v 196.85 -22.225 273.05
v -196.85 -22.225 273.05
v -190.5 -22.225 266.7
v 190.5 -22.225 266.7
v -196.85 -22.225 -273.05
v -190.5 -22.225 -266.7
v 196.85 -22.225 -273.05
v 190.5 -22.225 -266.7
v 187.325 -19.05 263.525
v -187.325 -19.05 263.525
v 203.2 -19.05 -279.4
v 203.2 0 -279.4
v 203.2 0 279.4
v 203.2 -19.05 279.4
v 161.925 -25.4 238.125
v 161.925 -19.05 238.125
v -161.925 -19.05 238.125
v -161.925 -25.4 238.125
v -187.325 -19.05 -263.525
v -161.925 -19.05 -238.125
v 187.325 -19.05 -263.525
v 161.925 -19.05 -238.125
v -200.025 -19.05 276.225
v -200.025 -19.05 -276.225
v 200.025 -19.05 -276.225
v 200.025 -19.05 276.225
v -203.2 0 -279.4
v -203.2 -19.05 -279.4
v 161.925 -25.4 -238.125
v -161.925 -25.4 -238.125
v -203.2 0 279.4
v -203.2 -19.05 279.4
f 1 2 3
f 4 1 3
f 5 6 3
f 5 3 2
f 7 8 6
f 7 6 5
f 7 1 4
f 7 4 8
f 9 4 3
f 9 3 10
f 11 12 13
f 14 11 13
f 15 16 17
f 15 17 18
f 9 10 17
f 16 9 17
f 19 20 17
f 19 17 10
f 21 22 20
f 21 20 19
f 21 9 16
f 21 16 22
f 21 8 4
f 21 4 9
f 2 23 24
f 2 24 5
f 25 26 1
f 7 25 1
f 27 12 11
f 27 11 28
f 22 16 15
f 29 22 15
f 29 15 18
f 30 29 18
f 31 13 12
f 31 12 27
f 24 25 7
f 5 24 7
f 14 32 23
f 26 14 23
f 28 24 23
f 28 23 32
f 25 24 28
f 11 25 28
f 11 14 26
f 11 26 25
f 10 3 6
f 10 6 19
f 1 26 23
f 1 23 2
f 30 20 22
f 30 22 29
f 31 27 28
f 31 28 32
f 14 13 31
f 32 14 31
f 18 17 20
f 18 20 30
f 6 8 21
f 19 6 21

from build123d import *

# Parameters (mm, degrees)
F0_W     = 203.2
F0_H     = 558.8
F1_DEPTH = 25.4


with BuildPart() as f1:
    # F0 (on Front) → F1 (new body)
    with BuildSketch(Plane.XZ):
        with Locations((101.6, 0)):
            Rectangle(F0_W, F0_H)
    extrude(amount=F1_DEPTH)

    # F4: sweep along a path in F3
    with BuildLine(Plane.XZ.offset(25.4)) as f4_path:
        Line((0, -238.125), (161.925, -238.125))
        Line((161.925, -238.125), (161.925, 238.125))
        Line((161.925, 238.125), (0, 238.125))
    # F2 (on Right) → F4 (sweep, cut)
    with BuildSketch(Plane.YZ):
        Polygon((-19.05, -263.525), (-19.05, -238.125), (-25.4, -238.125), (-25.4, -279.4), (-19.05, -279.4), (-19.05, -276.225), (-22.225, -273.05), (-22.225, -266.7), align=None)
    sweep(path=f4_path.line, transition=Transition.RIGHT, mode=Mode.SUBTRACT)

    # F5: F1 across plane


with BuildPart() as f1_1:
    add(f1.part)
    add(f1.part.mirror(Plane.YZ))


solid = f1_1.part
